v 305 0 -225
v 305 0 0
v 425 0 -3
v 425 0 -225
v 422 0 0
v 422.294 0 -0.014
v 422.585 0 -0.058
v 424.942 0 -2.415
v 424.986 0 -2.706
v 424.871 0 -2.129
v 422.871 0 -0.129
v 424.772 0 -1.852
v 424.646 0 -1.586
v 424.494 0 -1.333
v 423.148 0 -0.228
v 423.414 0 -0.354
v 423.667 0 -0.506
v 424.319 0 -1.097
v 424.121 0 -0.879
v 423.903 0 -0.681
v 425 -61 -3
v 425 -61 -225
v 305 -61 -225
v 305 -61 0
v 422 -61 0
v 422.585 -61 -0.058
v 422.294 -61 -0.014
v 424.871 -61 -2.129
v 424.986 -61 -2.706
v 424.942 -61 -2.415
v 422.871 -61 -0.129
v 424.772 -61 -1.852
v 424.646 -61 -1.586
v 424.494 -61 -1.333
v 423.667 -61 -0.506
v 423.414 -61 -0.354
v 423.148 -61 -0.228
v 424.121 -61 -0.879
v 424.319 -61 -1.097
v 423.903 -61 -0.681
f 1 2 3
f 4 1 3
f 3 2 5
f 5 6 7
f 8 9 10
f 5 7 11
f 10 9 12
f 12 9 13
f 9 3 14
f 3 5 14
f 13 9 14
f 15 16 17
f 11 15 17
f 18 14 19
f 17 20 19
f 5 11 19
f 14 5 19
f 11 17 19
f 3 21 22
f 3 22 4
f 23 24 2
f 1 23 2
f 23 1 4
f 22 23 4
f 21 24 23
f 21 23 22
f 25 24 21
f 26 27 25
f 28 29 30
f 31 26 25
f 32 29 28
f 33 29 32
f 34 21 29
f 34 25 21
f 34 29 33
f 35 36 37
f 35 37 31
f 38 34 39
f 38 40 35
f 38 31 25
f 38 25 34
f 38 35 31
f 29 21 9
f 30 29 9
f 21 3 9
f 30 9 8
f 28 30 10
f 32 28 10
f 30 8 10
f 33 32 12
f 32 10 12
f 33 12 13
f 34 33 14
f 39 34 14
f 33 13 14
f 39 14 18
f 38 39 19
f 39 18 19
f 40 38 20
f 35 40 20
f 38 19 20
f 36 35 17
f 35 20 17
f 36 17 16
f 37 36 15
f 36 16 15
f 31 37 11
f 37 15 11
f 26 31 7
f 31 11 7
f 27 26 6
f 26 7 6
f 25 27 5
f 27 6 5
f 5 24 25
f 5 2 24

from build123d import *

# Parameters (mm, degrees)
SKETCH_1_W      = 120
SKETCH_1_H      = 61
EXTRUDE_1_DEPTH = 225
FILLET_1_R      = 3


with BuildPart() as part:
    # 草图1 → 凸台-拉伸1 (new body)
    with BuildSketch(Plane.XY):
        with Locations((365, -30.5)):
            Rectangle(SKETCH_1_W, SKETCH_1_H)
    extrude(amount=-EXTRUDE_1_DEPTH)

    # 圆角1
    fillet_1_edges = [part.edges().sort_by_distance(p)[0] for p in [
        (425, -30.5, 0),
    ]]
    fillet(fillet_1_edges, radius=FILLET_1_R)


solid = part.part
